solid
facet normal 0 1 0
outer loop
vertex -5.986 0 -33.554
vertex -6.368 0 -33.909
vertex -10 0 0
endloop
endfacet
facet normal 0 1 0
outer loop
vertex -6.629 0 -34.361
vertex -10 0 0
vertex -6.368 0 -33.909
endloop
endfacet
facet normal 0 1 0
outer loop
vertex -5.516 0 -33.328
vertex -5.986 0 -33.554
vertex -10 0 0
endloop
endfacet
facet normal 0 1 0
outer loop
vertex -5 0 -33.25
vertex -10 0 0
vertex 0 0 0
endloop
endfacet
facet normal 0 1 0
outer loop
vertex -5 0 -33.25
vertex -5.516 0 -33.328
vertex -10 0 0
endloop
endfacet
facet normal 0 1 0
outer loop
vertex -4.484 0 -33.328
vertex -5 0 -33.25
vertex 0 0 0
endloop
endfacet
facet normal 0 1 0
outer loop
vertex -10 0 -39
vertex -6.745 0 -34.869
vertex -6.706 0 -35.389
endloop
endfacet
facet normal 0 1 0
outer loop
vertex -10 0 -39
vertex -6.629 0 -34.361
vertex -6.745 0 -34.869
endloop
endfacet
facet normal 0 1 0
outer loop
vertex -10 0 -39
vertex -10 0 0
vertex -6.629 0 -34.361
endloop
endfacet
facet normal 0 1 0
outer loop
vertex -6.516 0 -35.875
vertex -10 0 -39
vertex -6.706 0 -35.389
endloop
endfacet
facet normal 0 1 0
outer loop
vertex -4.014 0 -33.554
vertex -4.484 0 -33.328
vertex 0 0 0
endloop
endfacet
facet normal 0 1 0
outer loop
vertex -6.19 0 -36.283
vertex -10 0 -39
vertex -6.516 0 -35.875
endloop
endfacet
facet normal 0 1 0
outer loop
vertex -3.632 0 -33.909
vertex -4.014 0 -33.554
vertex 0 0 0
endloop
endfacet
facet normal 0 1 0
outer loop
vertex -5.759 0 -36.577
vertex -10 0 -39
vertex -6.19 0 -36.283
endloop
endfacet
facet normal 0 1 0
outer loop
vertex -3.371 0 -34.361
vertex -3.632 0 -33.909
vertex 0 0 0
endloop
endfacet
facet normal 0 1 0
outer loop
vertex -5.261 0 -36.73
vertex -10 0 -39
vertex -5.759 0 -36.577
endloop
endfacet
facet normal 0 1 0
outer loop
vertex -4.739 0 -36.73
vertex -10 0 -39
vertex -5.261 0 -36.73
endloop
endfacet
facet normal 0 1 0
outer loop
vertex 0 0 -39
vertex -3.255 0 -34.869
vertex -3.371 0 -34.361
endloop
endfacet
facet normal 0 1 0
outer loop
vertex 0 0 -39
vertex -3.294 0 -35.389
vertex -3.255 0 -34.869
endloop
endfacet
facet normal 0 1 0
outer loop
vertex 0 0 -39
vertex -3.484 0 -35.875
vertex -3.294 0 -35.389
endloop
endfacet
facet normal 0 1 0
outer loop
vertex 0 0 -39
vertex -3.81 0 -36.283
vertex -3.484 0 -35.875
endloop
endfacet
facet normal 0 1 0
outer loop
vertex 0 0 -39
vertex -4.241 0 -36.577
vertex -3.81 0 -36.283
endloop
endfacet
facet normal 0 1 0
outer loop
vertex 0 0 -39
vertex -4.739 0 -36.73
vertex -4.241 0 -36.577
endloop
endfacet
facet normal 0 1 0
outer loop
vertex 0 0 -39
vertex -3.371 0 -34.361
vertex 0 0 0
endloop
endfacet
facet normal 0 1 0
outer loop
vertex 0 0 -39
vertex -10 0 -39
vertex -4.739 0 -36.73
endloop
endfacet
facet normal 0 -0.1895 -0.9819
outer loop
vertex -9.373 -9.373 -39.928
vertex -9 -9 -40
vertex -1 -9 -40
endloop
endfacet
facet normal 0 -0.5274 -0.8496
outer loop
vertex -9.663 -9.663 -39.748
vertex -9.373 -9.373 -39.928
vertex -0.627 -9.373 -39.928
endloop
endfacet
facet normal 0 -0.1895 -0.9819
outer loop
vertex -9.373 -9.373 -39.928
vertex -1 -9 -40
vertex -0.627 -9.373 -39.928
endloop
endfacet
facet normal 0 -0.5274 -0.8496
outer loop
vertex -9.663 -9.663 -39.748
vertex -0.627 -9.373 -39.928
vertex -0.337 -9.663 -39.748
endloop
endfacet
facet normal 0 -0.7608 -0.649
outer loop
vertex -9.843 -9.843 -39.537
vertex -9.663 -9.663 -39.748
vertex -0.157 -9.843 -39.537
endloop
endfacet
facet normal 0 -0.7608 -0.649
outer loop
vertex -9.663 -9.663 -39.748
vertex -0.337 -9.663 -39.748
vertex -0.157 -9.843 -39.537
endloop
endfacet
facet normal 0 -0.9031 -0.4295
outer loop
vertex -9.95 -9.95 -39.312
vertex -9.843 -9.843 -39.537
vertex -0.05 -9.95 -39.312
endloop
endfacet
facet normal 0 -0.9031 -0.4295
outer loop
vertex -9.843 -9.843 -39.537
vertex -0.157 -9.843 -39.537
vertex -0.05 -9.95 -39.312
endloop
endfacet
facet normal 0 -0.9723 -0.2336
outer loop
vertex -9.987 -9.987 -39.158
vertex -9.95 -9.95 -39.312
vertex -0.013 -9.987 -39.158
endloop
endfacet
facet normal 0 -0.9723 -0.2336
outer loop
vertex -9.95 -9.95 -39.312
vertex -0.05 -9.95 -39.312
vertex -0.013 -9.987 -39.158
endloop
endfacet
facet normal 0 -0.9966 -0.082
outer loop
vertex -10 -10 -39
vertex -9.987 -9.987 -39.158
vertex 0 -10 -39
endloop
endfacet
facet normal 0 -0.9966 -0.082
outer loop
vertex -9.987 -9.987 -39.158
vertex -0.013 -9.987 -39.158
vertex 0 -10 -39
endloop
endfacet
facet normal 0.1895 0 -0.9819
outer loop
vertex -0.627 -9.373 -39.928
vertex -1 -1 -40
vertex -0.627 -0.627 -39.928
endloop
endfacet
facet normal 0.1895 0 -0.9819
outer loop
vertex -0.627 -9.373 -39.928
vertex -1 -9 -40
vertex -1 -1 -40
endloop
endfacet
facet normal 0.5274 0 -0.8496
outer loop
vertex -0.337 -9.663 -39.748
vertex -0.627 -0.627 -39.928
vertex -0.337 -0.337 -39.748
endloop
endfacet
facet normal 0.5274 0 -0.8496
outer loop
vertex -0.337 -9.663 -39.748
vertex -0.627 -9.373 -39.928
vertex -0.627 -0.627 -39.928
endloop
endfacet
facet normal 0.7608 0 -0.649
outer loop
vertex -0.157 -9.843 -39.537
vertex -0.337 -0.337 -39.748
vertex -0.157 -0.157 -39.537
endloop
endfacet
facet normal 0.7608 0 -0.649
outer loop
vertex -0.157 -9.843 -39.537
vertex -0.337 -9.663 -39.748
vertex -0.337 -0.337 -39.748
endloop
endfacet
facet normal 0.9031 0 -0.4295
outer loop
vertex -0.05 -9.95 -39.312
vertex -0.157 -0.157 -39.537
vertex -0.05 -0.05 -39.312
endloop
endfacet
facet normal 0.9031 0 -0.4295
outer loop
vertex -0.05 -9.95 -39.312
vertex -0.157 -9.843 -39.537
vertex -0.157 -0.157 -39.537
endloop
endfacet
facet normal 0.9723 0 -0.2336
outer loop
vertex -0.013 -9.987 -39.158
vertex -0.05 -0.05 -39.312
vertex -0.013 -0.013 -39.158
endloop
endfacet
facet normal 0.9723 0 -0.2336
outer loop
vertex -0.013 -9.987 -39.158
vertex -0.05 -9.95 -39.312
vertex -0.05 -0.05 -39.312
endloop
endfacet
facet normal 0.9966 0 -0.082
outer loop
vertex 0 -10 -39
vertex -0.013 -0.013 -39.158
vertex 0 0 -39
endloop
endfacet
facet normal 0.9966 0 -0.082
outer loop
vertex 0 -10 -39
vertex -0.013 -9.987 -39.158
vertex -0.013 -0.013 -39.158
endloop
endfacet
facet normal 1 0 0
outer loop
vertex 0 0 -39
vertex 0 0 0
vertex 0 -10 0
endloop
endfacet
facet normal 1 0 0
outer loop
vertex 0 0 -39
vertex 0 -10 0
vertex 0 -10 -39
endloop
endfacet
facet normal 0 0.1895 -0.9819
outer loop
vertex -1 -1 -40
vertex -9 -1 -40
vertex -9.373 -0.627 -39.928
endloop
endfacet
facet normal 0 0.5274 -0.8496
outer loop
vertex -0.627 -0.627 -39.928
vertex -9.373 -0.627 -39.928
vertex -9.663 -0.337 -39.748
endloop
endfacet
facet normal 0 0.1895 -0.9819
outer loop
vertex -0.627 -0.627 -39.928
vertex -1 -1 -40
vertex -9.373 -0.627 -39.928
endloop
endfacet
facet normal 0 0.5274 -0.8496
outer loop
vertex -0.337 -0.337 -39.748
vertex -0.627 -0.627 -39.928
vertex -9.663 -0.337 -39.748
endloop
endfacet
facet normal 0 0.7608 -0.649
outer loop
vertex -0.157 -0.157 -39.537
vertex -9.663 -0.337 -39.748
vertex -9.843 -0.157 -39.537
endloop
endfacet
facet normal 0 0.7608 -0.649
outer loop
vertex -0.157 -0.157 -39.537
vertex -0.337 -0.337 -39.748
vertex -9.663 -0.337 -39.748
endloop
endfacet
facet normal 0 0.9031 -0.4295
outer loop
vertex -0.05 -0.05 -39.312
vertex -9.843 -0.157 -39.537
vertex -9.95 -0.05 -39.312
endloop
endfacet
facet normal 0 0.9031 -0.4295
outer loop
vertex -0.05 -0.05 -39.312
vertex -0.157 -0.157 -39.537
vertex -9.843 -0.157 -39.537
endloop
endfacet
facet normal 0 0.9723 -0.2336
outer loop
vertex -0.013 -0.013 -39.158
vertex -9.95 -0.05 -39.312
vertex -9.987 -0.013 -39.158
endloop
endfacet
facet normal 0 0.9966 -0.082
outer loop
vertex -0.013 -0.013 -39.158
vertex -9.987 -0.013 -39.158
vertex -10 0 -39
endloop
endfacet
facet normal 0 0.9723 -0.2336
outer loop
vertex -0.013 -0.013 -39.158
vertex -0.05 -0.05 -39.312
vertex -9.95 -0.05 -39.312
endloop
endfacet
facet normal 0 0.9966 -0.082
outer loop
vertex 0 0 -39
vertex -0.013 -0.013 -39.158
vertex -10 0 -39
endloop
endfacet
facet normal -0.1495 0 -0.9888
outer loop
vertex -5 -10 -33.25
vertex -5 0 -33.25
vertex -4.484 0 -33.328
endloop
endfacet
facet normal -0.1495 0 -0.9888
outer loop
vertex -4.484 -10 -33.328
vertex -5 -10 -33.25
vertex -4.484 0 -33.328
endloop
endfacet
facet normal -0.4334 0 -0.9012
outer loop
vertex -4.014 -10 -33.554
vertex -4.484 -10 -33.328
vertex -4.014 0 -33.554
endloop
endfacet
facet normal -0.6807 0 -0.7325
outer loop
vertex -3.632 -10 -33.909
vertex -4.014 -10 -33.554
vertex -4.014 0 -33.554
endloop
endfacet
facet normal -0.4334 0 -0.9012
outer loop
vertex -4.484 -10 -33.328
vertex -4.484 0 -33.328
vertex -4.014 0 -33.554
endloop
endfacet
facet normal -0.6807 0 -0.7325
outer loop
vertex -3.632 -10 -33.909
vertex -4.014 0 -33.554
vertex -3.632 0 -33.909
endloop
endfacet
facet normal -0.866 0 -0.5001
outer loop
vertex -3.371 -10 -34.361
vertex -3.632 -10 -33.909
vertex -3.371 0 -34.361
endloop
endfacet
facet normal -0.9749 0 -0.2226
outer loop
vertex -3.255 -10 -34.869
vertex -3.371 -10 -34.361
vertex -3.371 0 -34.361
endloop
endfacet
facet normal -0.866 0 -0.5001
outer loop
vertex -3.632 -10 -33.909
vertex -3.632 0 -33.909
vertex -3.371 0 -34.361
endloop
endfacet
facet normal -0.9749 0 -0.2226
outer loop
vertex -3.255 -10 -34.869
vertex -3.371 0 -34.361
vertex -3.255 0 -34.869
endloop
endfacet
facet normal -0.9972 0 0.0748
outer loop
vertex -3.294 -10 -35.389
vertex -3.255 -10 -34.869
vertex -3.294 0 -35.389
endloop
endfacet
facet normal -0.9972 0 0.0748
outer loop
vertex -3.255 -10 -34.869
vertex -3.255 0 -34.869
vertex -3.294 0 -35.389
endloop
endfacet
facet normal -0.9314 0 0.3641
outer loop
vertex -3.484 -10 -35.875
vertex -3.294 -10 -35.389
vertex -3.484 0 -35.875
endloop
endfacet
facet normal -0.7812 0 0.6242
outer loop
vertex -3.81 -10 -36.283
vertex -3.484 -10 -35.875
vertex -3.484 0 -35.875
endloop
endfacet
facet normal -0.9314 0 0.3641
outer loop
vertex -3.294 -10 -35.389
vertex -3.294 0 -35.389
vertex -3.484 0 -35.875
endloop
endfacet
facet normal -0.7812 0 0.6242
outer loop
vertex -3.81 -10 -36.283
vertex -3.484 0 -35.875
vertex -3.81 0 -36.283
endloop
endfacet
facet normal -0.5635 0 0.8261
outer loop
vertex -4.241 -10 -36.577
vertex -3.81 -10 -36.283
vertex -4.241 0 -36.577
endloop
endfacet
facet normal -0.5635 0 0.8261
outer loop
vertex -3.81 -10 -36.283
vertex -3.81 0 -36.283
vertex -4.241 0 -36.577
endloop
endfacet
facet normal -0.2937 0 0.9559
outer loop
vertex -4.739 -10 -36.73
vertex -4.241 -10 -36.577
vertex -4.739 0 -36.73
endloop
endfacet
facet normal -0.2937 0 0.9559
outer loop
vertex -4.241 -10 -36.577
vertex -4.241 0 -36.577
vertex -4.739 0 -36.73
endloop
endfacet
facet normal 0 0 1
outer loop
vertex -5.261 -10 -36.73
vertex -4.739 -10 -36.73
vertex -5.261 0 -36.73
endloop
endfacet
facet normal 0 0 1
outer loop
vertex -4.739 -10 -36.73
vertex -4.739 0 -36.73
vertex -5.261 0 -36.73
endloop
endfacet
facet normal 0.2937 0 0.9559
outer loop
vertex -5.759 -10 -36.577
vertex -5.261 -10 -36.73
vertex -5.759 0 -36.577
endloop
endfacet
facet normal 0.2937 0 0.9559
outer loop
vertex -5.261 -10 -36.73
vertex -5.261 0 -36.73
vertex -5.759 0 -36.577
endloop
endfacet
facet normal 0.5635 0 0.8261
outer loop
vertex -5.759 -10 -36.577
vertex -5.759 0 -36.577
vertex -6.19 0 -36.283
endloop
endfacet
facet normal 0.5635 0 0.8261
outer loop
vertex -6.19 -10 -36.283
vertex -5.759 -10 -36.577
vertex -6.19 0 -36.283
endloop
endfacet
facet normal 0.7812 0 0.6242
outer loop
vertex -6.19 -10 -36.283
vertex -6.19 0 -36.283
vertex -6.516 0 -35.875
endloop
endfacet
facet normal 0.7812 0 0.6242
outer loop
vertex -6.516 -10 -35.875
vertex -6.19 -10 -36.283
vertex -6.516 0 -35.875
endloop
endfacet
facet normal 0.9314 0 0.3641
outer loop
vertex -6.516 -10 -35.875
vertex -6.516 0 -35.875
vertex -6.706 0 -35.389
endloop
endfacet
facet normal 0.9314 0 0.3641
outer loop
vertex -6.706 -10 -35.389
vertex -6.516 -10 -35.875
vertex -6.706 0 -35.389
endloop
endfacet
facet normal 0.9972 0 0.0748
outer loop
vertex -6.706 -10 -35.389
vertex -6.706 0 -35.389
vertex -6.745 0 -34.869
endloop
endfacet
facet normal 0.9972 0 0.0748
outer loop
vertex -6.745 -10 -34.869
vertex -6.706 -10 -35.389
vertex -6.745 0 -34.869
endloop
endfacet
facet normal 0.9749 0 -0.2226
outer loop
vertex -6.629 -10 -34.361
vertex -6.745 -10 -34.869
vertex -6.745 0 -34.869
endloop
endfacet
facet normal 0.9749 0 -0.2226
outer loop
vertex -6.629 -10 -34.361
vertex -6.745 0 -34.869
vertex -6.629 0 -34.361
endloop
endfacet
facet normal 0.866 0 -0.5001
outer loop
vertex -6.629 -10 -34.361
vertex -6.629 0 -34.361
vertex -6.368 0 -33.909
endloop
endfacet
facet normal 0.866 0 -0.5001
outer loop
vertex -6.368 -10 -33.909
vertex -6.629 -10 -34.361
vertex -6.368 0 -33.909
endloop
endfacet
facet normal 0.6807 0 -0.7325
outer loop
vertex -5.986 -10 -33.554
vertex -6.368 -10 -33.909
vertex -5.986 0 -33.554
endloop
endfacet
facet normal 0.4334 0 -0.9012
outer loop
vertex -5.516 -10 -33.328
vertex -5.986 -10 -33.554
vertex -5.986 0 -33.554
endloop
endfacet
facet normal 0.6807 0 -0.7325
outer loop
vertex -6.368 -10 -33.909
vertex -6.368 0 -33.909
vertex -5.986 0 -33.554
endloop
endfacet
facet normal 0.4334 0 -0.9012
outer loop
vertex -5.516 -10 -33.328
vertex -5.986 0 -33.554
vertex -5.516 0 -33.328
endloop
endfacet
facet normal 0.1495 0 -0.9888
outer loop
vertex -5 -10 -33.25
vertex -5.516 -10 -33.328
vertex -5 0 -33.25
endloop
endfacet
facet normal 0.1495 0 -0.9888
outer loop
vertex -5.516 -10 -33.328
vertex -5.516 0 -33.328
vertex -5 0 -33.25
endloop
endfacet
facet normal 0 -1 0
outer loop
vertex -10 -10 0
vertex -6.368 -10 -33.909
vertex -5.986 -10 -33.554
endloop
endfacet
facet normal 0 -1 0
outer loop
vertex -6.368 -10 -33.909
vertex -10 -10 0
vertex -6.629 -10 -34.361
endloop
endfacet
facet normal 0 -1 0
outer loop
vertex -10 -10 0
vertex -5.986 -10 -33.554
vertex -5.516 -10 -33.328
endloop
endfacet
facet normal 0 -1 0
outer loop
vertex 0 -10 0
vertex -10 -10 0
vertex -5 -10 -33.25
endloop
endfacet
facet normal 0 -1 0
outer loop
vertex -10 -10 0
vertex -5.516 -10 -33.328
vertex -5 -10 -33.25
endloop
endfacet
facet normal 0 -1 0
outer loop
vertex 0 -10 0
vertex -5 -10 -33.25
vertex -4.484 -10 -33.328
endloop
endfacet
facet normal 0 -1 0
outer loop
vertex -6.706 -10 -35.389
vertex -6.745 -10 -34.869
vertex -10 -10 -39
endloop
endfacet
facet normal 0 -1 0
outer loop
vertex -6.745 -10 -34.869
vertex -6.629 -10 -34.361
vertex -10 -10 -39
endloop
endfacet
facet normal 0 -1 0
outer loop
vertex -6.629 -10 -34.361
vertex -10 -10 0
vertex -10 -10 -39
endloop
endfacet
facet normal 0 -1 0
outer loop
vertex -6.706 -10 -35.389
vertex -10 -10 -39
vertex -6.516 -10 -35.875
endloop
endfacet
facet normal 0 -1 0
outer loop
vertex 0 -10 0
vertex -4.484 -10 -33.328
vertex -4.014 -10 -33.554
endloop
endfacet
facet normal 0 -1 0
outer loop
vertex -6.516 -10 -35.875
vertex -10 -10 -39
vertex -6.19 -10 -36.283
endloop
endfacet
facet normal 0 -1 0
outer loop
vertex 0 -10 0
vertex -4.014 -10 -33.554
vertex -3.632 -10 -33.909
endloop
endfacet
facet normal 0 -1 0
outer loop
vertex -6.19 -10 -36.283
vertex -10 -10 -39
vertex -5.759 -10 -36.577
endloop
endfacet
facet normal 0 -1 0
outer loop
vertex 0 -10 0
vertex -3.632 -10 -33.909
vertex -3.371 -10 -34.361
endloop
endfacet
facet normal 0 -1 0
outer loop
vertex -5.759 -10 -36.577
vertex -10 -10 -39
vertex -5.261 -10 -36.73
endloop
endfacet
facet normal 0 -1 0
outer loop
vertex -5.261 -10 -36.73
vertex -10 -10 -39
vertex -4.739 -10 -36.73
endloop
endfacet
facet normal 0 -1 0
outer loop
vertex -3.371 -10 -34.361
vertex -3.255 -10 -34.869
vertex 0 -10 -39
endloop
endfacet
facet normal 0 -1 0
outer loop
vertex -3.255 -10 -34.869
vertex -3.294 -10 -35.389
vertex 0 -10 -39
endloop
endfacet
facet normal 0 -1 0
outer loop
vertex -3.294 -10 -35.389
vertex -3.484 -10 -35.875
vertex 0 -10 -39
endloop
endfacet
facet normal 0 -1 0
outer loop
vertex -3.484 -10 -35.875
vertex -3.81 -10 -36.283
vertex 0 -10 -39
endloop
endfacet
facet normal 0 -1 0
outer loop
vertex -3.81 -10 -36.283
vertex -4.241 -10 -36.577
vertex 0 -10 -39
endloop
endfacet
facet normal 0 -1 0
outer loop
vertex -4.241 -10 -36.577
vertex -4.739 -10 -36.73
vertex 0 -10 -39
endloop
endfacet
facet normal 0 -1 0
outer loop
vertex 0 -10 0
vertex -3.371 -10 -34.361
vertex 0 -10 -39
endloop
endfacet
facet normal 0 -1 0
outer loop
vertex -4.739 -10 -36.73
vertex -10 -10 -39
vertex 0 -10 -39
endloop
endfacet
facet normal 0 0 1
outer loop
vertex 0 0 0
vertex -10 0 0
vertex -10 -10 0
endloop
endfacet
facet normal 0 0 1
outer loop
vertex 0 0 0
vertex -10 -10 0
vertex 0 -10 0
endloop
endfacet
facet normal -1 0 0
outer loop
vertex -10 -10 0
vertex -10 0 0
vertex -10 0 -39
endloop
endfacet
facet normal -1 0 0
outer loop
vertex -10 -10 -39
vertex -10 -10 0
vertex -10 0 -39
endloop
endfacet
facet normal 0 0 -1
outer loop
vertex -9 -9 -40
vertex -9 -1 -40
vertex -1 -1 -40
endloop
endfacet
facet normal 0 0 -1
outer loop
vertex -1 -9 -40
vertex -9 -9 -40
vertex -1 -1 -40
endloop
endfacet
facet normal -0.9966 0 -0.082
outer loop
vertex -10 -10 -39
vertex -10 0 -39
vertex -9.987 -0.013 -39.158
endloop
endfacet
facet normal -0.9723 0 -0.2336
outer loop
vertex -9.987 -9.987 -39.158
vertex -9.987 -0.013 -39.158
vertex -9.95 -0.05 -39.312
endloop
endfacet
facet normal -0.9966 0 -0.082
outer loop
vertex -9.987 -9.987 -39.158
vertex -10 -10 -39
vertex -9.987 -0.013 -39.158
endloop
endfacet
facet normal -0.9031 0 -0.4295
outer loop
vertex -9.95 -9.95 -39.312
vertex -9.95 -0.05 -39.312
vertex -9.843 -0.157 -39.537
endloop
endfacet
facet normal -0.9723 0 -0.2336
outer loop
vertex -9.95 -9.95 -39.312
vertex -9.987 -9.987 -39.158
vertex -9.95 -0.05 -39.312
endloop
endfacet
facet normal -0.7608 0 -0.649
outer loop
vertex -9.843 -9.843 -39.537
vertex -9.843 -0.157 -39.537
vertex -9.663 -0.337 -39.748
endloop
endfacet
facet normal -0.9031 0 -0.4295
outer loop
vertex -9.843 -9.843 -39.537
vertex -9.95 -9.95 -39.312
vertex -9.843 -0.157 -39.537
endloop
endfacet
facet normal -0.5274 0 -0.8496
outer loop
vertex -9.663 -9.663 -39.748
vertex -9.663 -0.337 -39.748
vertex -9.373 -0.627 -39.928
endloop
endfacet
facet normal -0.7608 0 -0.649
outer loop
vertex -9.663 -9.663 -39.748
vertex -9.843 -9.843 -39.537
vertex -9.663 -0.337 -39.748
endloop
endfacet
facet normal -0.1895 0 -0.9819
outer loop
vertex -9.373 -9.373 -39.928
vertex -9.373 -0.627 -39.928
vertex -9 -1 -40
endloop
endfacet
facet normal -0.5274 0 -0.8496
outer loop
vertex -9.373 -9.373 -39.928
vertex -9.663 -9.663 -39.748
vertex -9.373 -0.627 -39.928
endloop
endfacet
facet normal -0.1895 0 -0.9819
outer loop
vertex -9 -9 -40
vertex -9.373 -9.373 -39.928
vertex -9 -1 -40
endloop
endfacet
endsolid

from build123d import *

# Parameters (mm, degrees)
SKIZZE1_W                       = 10
SKIZZE1_H                       = 40
SKIZZE1_R                       = 1.75
AUFSATZ_LINEAR_AUSTRAGEN1_DEPTH = 10
VERRUNDUNG1_R                   = 1


with BuildPart() as part:
    # Skizze1 → Aufsatz-Linear austragen1 (new body)
    with BuildSketch(Plane(origin=(0, 0, 0), x_dir=(1, 0, 0), z_dir=(0, 1, 0))):
        with Locations((-5, 20)):
            Rectangle(SKIZZE1_W, SKIZZE1_H)
        with Locations(Location((-5, 35, 0), (0, 0, 270))):
            Circle(SKIZZE1_R, mode=Mode.SUBTRACT)
    extrude(amount=-AUFSATZ_LINEAR_AUSTRAGEN1_DEPTH)

    # Verrundung1
    verrundung1_edges = [part.edges().sort_by_distance(p)[0] for p in [
        (-5, 0, -40),
        (-5, -10, -40),
        (-10, -5, -40),
        (0, -5, -40),
    ]]
    fillet(verrundung1_edges, radius=VERRUNDUNG1_R)


solid = part.part
